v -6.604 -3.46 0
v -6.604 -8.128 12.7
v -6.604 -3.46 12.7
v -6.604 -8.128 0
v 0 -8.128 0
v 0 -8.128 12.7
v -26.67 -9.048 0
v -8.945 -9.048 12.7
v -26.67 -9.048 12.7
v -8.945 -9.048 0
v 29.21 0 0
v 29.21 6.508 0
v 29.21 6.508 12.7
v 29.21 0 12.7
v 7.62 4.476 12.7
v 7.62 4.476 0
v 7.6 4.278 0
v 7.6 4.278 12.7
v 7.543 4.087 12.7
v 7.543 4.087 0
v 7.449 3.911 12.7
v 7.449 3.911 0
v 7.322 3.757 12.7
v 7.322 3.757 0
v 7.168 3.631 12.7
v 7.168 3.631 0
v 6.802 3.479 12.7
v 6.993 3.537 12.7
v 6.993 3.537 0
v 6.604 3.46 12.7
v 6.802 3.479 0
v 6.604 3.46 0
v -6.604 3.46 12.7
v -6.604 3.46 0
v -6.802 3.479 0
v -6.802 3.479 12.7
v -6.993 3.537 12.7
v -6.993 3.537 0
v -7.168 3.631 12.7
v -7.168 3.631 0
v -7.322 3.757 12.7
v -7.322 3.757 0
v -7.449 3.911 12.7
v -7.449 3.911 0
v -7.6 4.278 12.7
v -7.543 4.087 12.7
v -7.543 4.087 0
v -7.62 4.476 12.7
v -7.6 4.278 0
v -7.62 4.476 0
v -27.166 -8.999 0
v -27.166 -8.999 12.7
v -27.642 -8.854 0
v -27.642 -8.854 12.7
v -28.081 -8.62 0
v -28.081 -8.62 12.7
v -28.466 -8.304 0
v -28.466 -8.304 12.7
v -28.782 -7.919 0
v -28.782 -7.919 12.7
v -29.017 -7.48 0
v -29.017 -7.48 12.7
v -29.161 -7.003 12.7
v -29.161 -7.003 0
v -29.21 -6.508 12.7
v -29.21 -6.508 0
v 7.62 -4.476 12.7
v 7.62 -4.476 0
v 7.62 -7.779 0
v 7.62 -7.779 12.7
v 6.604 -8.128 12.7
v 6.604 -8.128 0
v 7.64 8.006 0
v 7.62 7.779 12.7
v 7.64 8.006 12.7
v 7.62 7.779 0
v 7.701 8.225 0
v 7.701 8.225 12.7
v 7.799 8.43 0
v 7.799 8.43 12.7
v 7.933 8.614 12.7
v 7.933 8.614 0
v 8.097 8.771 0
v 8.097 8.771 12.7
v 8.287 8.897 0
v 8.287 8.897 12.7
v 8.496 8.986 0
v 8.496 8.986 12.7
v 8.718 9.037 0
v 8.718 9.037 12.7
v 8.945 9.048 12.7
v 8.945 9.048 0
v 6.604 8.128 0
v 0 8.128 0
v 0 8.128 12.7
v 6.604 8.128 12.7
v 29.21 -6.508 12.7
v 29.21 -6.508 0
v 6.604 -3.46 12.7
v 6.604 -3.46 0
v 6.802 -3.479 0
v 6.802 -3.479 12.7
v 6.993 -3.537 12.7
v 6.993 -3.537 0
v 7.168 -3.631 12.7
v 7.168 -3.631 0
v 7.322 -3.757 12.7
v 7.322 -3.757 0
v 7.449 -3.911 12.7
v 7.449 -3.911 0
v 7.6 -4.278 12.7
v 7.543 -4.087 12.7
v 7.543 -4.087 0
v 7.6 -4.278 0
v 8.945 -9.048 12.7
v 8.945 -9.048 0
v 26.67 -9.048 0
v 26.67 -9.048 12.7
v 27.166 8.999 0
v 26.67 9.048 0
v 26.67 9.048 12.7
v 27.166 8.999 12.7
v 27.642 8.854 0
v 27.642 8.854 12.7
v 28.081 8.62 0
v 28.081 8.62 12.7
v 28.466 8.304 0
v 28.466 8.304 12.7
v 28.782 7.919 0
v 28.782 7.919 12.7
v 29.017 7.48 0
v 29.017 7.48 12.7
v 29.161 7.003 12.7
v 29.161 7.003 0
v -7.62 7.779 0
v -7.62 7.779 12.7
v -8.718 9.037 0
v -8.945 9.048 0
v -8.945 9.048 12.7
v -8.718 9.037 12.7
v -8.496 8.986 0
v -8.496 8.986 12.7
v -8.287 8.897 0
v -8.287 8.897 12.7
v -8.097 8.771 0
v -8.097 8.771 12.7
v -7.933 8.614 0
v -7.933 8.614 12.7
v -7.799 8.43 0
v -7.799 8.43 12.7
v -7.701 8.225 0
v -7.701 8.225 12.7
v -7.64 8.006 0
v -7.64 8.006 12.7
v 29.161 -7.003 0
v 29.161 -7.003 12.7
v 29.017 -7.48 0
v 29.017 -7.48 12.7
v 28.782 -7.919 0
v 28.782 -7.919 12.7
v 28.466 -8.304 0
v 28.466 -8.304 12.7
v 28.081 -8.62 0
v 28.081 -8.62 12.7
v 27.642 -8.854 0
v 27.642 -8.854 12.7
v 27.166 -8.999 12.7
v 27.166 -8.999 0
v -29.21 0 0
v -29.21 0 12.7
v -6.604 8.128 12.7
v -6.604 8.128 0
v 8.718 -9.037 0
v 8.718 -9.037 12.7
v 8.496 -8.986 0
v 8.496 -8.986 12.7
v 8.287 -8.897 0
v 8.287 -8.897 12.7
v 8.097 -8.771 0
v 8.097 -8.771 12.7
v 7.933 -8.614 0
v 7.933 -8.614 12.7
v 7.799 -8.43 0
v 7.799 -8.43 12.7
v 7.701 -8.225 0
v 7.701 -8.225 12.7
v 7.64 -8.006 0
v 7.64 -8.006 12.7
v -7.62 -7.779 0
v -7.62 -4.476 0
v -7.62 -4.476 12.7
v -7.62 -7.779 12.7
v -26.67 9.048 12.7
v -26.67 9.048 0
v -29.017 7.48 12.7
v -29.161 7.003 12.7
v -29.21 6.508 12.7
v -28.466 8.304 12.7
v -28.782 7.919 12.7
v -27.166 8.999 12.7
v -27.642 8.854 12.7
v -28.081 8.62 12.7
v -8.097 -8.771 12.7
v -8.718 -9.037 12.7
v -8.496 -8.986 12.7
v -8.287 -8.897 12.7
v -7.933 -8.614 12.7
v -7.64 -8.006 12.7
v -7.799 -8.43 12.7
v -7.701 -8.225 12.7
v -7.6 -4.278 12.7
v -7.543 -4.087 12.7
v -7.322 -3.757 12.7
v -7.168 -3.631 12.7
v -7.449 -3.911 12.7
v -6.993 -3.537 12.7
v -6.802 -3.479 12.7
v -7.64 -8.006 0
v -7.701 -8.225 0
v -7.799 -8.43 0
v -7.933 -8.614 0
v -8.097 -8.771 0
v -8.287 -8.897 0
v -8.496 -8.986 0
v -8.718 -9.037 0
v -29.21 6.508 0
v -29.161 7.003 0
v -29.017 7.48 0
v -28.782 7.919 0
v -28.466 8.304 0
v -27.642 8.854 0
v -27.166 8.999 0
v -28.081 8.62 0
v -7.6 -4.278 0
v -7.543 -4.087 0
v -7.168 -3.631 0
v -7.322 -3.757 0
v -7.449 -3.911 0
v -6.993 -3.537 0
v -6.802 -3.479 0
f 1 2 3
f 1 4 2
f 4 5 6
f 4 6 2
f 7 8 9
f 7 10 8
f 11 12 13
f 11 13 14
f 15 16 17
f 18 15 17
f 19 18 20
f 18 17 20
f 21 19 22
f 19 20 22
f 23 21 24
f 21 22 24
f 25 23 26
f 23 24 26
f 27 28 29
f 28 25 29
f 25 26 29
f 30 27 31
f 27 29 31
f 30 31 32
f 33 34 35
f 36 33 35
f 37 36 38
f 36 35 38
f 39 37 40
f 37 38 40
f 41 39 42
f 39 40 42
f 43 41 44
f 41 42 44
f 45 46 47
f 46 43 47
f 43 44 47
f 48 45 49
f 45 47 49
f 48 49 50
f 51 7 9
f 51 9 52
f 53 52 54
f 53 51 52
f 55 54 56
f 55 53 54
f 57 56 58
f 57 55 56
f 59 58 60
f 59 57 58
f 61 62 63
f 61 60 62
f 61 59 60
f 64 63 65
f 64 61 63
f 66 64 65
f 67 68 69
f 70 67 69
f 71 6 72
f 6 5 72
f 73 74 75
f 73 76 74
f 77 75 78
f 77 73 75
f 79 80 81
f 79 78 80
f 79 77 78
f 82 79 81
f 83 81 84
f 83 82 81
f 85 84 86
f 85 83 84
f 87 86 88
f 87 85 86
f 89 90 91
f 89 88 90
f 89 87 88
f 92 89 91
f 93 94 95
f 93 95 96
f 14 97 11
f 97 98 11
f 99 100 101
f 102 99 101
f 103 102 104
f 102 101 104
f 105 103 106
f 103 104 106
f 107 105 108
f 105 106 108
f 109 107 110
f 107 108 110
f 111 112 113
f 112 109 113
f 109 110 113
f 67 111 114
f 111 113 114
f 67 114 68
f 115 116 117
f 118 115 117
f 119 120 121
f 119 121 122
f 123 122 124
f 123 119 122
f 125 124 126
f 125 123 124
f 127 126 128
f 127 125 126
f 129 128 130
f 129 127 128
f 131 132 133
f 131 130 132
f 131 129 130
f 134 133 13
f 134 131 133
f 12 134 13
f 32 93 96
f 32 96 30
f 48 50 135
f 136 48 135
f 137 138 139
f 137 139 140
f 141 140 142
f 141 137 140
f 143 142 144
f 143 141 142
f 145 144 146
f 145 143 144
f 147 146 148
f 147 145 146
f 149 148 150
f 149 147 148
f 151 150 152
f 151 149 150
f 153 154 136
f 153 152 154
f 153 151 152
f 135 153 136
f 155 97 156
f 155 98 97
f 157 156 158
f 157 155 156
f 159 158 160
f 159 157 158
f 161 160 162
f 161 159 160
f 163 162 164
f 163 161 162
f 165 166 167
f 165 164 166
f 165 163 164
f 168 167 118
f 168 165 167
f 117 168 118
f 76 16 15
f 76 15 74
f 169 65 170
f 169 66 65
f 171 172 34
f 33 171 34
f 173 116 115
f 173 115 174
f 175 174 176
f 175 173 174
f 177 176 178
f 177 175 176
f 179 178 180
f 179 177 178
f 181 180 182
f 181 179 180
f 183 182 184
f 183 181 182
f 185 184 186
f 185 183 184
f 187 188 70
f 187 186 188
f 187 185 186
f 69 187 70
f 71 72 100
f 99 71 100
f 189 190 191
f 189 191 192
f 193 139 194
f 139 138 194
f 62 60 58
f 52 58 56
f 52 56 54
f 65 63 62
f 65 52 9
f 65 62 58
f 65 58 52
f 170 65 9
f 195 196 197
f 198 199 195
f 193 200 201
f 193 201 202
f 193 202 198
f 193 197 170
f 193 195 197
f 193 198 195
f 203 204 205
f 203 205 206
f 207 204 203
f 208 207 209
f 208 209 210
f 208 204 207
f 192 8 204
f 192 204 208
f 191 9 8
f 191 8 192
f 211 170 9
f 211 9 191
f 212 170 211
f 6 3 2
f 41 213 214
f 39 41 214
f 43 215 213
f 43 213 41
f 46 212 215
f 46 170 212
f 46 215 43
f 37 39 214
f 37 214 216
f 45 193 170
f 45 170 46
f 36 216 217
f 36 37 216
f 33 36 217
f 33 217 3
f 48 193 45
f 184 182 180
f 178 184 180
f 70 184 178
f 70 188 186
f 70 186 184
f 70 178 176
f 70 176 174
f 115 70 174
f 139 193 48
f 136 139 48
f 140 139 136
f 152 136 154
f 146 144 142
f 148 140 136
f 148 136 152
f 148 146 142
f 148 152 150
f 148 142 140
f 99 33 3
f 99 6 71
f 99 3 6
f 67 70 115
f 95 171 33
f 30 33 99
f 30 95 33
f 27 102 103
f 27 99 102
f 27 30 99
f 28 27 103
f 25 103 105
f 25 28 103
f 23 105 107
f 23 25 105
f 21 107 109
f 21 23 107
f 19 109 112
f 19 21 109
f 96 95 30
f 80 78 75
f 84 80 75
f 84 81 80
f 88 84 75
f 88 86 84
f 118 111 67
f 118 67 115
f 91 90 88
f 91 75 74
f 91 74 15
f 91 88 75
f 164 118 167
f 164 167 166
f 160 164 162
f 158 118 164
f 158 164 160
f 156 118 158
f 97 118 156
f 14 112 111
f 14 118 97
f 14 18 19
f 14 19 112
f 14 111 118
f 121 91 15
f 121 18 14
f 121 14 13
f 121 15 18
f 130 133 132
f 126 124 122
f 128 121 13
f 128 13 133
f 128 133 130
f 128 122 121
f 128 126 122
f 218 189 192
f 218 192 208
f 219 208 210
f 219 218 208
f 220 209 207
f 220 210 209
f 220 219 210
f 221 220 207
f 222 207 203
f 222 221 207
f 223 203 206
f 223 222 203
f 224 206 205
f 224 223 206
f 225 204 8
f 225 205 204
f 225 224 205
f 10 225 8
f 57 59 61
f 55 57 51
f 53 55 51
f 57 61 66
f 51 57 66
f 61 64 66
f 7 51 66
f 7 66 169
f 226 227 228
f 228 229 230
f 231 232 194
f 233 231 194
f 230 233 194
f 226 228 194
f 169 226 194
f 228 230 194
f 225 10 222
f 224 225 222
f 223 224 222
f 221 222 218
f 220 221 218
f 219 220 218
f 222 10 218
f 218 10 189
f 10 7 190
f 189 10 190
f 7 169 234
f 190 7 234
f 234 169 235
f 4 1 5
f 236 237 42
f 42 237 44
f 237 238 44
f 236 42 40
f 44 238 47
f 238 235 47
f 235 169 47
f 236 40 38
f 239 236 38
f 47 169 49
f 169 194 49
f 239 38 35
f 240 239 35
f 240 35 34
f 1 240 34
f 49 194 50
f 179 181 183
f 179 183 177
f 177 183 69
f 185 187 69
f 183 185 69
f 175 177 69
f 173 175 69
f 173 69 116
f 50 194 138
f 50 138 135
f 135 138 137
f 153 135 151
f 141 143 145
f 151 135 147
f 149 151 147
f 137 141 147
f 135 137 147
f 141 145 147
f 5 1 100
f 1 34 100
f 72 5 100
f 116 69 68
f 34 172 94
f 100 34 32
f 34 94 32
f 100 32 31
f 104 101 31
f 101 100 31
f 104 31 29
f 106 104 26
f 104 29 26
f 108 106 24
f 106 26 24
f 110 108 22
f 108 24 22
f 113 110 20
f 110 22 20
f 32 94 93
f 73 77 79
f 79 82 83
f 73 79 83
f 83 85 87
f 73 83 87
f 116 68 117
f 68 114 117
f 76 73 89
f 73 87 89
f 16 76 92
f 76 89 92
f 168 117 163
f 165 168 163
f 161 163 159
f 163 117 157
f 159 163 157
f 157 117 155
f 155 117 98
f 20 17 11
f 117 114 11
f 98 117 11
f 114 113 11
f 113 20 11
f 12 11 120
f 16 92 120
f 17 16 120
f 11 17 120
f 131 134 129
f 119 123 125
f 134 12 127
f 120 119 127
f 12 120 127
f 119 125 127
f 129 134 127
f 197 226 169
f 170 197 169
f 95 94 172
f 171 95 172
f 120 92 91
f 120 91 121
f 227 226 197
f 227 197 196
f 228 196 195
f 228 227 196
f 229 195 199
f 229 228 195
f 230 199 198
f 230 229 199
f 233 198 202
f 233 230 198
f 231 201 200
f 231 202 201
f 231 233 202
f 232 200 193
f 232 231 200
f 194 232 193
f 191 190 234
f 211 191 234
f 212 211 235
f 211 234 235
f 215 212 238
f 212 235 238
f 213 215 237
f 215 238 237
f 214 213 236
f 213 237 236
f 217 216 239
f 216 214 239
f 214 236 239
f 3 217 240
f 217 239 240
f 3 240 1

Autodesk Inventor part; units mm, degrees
ref_plane "YZ Plane" through (0, 0, 0) normal (1, 0, 0) x (0, 1, 0)
ref_plane "XZ Plane" through (0, 0, 0) normal (0, 1, 0) x (-1, 0, 0)
ref_plane "XY Plane" through (0, 0, 0) normal (0, 0, 1) x (1, 0, 0)
sketch "Sketch1" plane through (0, 0, 0) normal (0, 0, 1) x (1, 0, 0)
  line L0 (0, 8.128) -> (-6.604, 8.128)
  line L1 (-6.604, 8.128) -> (-6.604, 3.4598)
  arc A0 (-7.62, 4.4758) -> (-6.604, 3.4598) centre (-6.604, 4.4758) ccw
  line L2 (-7.62, 4.4758) -> (-7.62, 7.779)
  line L3 (-29.21, 6.5078) -> (-29.21, 0)
  arc A1 (-7.62, 7.779) -> (-8.945, 9.0478) centre (-8.89, 7.779) ccw
  line L4 (-8.945, 9.0478) -> (-26.67, 9.0478)
  arc A2 (-26.67, 9.0478) -> (-29.21, 6.5078) centre (-26.67, 6.5078) ccw
  line L5 (0, 8.128) -> (6.604, 8.128)
  line L6 (6.604, 8.128) -> (6.604, 3.4598)
  arc A3 (6.604, 3.4598) -> (7.62, 4.4758) centre (6.604, 4.4758) ccw
  line L7 (7.62, 4.4758) -> (7.62, 7.779)
  line L8 (29.21, 6.5078) -> (29.21, 0)
  arc A4 (8.945, 9.0478) -> (7.62, 7.779) centre (8.89, 7.779) ccw
  line L9 (8.945, 9.0478) -> (26.67, 9.0478)
  arc A5 (29.21, 6.5078) -> (26.67, 9.0478) centre (26.67, 6.5078) ccw
  line L10 (0, -8.128) -> (-6.604, -8.128)
  line L11 (-6.604, -8.128) -> (-6.604, -3.4598)
  arc A6 (-6.604, -3.4598) -> (-7.62, -4.4758) centre (-6.604, -4.4758) ccw
  line L12 (-7.62, -4.4758) -> (-7.62, -7.779)
  line L13 (-29.21, -6.5078) -> (-29.21, 0)
  arc A7 (-8.945, -9.0478) -> (-7.62, -7.779) centre (-8.89, -7.779) ccw
  line L14 (-8.945, -9.0478) -> (-26.67, -9.0478)
  arc A8 (-29.21, -6.5078) -> (-26.67, -9.0478) centre (-26.67, -6.5078) ccw
  line L15 (0, -8.128) -> (6.604, -8.128)
  line L16 (6.604, -8.128) -> (6.604, -3.4598)
  arc A9 (7.62, -4.4758) -> (6.604, -3.4598) centre (6.604, -4.4758) ccw
  line L17 (7.62, -4.4758) -> (7.62, -7.779)
  line L18 (29.21, -6.5078) -> (29.21, 0)
  arc A10 (7.62, -7.779) -> (8.945, -9.0478) centre (8.89, -7.779) ccw
  line L19 (8.945, -9.0478) -> (26.67, -9.0478)
  arc A11 (26.67, -9.0478) -> (29.21, -6.5078) centre (26.67, -6.5078) ccw
  point P0 (0, 0)
  dimension "d0" = 8.128
  dimension "d2" = 29.21
  dimension "d4" = 1.016
  dimension "d5" = 1.016
  dimension "d10" = 1.27
  dimension "d11" = 2.54
  dimension "d12" = 5.588
extrude "Extrusion1" add sketch "Sketch1" along normal blind 12.7
properties part number "ConnectorDE" material "ABS Plastic"
